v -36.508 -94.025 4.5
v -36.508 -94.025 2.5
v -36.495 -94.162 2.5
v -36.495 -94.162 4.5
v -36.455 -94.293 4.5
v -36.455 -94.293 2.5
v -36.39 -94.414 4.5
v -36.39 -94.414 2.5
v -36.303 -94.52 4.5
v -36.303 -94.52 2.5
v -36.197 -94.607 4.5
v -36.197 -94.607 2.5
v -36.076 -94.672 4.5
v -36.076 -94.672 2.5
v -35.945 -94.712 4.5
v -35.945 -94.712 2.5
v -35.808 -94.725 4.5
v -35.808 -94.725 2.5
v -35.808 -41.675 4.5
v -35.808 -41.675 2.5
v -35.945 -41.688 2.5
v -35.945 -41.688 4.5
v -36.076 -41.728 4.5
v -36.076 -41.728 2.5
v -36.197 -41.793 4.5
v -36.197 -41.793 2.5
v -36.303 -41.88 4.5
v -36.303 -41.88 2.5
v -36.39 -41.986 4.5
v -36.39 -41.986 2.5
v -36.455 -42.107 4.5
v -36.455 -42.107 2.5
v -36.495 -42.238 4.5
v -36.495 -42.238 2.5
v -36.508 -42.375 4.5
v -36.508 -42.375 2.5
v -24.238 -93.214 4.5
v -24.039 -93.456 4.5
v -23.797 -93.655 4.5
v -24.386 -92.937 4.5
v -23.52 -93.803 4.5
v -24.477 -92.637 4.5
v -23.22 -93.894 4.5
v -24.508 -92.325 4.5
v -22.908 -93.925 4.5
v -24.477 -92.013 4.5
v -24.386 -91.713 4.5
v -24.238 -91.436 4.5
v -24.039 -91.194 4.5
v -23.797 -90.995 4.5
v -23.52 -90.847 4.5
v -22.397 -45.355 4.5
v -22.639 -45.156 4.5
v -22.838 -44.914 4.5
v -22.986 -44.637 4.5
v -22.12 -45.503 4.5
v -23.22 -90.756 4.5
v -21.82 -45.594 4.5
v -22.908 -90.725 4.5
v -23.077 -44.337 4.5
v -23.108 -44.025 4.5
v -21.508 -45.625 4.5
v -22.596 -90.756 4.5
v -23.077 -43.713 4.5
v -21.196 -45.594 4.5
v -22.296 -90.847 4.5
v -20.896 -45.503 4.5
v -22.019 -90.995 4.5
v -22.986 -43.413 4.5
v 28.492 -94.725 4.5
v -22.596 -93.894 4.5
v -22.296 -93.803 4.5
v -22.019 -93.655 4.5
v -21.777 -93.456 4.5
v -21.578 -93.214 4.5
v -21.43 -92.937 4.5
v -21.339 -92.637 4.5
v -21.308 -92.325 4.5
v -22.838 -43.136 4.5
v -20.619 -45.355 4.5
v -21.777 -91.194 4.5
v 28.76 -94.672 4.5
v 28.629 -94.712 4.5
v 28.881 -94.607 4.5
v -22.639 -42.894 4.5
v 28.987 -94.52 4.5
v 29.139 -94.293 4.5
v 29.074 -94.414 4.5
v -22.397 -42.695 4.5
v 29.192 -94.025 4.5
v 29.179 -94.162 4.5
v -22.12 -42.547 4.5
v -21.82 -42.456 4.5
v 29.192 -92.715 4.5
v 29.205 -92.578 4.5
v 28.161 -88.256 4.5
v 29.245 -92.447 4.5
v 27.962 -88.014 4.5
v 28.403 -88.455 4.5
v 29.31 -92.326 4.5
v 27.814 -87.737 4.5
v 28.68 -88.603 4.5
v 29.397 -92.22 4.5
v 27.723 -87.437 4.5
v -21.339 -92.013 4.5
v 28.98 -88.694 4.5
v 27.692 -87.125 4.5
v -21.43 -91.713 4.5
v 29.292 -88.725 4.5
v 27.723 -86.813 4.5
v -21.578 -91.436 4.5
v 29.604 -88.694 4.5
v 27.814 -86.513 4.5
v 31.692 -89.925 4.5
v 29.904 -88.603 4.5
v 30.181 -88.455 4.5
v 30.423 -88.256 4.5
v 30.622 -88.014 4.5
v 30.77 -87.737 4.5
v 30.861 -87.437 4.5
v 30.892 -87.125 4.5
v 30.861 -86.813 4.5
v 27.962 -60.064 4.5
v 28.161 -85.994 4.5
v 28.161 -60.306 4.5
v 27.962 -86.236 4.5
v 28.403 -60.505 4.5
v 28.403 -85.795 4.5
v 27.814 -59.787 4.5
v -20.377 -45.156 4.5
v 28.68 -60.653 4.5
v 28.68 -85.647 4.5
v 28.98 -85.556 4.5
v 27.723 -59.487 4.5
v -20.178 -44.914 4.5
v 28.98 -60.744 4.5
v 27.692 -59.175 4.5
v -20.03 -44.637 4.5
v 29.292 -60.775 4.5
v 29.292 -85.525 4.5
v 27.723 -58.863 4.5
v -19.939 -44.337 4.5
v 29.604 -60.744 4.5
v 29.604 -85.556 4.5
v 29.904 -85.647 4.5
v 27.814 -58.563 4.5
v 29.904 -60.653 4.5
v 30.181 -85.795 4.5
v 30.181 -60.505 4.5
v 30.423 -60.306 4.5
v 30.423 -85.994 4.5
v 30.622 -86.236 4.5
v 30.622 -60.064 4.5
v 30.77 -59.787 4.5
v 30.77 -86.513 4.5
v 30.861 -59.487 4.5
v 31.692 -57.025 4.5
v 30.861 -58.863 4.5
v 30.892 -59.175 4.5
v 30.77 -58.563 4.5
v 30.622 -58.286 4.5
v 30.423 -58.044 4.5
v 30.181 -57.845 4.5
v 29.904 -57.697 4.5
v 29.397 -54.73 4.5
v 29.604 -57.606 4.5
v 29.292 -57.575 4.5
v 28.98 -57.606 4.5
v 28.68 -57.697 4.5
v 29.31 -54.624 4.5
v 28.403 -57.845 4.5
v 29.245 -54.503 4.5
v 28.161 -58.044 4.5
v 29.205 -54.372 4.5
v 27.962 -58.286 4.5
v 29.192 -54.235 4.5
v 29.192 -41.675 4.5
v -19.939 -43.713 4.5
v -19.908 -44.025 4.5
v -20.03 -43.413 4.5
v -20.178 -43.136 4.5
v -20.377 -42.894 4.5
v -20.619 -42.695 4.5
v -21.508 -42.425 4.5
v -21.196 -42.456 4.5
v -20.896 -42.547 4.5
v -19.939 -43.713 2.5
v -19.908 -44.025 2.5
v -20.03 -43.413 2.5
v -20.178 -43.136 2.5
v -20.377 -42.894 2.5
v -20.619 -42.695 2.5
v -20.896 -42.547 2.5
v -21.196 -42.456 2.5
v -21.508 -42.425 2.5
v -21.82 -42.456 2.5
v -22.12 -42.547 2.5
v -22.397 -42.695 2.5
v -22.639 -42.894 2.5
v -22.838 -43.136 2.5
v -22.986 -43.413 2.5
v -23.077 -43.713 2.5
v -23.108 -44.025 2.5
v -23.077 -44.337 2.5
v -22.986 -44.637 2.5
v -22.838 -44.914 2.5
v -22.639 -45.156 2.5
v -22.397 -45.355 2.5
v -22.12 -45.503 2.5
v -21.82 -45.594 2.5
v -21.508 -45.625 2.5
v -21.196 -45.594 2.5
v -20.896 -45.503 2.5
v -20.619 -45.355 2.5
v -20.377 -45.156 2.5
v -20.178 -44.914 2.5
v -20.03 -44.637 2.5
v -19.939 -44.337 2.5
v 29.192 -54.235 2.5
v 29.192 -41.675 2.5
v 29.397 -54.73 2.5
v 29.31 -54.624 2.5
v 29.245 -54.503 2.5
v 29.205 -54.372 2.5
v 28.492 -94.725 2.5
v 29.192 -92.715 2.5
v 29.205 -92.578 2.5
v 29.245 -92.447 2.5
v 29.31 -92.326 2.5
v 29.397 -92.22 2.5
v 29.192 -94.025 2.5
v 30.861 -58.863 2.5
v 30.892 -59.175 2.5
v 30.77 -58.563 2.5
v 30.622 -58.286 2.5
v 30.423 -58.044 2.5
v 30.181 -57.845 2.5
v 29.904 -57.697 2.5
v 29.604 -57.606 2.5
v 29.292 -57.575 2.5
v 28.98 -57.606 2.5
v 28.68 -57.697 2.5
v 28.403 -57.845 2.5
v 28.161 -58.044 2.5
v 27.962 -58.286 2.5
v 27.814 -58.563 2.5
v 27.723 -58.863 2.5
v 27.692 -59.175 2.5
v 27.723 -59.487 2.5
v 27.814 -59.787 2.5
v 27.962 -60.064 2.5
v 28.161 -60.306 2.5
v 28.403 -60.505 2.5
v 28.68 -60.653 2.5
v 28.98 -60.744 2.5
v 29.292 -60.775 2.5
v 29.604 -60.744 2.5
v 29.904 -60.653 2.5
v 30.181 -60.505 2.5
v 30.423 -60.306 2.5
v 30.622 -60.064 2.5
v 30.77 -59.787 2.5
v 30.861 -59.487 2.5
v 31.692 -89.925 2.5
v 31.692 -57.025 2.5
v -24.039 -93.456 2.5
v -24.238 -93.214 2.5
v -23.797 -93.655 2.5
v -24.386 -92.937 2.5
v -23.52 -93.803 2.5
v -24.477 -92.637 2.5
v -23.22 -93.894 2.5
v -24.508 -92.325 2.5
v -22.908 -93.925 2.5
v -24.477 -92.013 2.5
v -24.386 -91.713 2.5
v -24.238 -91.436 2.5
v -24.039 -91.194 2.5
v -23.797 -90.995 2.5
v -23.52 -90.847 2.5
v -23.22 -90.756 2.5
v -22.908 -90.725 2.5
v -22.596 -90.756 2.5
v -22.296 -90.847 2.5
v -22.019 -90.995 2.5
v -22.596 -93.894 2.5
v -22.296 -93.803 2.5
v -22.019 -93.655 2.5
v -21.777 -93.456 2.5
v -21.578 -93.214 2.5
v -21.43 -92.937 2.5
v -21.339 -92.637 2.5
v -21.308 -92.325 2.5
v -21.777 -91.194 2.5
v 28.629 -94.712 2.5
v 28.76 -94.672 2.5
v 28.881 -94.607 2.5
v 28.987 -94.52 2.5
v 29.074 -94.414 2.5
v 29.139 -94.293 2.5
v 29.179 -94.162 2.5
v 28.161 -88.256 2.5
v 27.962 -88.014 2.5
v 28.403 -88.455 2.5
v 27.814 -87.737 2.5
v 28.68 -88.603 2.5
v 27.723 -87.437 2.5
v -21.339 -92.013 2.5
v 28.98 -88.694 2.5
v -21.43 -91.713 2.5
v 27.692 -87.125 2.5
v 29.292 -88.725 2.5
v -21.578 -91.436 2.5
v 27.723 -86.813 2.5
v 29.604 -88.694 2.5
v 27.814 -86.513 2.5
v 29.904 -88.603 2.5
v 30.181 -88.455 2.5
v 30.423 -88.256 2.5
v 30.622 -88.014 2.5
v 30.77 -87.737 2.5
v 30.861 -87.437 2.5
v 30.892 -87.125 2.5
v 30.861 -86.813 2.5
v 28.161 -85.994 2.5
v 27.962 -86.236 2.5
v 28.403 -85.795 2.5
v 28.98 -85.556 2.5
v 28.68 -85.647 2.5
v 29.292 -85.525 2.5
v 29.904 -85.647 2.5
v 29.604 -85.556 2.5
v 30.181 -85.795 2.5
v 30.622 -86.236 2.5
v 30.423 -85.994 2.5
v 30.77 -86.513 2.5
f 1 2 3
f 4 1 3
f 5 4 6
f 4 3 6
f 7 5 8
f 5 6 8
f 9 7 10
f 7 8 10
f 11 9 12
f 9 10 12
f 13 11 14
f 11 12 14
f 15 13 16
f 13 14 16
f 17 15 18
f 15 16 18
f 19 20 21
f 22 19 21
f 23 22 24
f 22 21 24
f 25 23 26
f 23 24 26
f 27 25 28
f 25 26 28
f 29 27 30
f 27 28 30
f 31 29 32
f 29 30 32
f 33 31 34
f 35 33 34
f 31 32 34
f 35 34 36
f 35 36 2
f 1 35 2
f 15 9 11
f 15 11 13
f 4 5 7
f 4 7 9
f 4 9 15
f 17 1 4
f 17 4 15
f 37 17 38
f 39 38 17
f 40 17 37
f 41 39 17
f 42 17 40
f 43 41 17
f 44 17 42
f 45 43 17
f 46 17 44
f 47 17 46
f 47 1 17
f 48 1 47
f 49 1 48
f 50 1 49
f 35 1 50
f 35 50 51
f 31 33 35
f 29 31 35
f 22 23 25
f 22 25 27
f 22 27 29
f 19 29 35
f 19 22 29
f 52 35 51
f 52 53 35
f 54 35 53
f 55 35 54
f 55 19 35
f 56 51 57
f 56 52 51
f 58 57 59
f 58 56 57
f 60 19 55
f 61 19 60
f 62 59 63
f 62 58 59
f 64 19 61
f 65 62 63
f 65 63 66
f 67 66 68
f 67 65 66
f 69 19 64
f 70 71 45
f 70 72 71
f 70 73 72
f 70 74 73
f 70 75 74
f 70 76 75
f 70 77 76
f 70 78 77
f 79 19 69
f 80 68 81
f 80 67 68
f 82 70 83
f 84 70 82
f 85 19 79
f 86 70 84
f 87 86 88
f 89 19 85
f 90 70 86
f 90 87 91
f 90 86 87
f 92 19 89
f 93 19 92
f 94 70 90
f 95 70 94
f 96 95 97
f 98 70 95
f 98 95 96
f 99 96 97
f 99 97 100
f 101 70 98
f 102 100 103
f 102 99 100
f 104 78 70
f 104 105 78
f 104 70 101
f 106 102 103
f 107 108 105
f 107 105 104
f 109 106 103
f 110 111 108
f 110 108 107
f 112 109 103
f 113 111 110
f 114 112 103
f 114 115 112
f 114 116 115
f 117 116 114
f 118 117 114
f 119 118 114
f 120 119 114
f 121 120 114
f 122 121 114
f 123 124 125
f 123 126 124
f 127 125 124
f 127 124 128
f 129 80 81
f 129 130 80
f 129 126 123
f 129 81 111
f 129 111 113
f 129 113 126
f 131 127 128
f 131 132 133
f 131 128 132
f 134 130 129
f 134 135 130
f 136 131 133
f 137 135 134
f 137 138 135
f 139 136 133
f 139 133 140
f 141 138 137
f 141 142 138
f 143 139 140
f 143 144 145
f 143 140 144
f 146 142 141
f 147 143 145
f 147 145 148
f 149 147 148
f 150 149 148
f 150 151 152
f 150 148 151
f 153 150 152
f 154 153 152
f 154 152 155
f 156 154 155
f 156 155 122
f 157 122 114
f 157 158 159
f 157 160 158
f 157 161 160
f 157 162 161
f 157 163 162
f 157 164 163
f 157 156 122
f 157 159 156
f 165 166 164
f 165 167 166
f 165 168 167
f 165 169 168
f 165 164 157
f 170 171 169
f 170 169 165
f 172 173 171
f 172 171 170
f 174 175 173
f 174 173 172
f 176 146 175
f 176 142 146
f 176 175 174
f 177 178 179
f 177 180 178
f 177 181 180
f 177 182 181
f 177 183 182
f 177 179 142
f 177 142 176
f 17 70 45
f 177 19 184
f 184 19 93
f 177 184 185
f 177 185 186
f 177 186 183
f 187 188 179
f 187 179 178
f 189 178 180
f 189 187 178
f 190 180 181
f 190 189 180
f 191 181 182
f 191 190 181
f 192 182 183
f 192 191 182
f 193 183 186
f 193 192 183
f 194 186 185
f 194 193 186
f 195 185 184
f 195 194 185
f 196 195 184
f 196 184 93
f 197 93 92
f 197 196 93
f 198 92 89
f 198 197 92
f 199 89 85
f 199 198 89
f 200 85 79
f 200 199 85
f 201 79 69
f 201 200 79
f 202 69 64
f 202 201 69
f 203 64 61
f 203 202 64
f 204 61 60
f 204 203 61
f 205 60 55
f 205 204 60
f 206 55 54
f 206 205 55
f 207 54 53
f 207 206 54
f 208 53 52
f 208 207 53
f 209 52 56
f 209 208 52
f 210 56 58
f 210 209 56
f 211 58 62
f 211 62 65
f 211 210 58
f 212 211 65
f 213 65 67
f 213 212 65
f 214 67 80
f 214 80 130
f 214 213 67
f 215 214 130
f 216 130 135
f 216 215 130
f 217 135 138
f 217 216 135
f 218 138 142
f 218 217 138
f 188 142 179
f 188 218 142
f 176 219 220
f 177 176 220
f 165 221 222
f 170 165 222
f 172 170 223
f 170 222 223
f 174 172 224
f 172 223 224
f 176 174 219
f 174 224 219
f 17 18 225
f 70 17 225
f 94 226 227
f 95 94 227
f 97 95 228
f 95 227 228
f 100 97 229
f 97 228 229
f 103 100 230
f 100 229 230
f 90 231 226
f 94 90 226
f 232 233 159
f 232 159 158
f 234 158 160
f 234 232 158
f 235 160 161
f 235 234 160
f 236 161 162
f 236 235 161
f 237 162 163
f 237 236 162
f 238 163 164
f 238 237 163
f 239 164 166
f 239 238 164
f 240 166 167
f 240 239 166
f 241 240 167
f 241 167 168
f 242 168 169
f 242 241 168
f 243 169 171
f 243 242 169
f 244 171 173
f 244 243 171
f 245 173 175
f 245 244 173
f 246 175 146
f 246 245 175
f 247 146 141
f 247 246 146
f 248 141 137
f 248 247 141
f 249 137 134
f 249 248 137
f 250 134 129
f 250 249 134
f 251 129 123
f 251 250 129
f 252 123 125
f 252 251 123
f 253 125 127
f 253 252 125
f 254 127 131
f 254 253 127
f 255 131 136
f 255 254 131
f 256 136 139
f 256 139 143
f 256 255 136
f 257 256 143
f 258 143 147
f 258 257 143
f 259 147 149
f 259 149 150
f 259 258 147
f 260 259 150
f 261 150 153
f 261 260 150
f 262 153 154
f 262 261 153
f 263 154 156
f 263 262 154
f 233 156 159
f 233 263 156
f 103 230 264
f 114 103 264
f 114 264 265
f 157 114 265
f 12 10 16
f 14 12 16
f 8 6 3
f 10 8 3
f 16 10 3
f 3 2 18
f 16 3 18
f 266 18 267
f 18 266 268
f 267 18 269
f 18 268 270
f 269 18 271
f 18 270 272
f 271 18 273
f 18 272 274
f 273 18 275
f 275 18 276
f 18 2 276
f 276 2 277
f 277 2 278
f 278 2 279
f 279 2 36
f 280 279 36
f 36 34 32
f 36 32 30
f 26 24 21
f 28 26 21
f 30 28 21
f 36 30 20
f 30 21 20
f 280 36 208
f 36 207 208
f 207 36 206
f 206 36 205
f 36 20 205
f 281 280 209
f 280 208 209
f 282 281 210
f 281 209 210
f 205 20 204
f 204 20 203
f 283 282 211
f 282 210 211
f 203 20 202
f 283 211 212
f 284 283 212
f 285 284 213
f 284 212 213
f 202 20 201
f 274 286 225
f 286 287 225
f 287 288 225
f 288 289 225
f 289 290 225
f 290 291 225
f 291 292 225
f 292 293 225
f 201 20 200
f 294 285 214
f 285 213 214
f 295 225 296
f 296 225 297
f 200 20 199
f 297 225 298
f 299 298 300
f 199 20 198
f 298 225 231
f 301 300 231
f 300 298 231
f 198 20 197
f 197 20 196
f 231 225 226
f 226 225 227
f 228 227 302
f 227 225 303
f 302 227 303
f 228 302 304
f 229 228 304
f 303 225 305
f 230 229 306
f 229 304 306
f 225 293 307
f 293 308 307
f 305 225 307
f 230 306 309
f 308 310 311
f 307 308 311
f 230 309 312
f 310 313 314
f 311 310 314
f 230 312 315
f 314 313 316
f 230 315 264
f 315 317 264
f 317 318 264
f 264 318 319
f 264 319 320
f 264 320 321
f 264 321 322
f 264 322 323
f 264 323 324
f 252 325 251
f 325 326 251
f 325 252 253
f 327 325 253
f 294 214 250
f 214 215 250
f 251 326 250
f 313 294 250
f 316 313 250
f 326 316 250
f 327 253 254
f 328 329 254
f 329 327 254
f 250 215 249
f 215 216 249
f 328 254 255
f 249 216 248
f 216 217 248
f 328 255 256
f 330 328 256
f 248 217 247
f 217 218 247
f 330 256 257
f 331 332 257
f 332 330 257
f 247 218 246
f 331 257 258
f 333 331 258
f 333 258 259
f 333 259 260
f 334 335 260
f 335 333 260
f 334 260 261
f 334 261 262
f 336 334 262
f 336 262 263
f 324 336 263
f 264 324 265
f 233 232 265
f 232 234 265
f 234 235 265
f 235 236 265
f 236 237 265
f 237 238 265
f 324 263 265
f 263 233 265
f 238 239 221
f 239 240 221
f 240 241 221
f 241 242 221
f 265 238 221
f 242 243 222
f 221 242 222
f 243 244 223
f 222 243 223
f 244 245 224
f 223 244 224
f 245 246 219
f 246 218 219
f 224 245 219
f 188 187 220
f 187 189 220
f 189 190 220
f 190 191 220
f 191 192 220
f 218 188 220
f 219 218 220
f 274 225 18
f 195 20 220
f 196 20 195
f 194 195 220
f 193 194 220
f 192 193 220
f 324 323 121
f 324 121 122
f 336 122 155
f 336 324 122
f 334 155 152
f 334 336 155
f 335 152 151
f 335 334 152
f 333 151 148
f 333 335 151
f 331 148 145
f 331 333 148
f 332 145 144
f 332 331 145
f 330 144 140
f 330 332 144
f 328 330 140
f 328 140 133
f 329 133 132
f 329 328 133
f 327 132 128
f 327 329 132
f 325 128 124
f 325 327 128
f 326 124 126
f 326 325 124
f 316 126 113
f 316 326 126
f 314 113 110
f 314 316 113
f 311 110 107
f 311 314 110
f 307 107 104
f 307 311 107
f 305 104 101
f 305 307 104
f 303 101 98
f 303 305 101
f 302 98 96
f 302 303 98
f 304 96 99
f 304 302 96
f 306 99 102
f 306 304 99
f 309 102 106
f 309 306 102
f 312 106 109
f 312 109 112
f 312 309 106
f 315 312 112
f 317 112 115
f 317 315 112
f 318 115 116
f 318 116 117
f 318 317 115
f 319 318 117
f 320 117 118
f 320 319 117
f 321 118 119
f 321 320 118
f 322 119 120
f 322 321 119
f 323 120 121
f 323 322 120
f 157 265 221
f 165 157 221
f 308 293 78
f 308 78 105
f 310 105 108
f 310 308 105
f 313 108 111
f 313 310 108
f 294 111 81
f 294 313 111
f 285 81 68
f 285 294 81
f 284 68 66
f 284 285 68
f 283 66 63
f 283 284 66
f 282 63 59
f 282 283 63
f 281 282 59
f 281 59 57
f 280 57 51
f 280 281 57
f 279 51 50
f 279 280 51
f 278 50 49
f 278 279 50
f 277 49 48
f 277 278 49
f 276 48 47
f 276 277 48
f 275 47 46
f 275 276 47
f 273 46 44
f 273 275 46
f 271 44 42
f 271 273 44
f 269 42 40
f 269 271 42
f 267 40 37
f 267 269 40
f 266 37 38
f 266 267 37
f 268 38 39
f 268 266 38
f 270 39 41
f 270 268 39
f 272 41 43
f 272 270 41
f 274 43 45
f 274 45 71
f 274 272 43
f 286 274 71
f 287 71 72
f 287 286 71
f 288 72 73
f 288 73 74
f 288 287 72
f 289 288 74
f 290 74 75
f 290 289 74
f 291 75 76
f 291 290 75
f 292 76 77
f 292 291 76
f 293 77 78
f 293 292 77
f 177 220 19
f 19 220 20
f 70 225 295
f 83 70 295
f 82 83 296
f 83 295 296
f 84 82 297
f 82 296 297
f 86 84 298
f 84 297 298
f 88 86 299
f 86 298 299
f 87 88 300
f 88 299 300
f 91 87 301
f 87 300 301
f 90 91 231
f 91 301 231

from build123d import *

# Parameters (mm, degrees)
BOSS_EXTRUDE1_START = 2.5
SKETCH1_R           = 1.6
BOSS_EXTRUDE1_DEPTH = 2


with BuildPart() as part:
    # Sketch1 → Boss-Extrude1 (new body)
    with BuildSketch(Plane.XY.offset(BOSS_EXTRUDE1_START)):
        with BuildLine():
            Line((-36.508029185, -42.375), (-36.508029185, -94.025))
            ThreePointArc((-36.508029185, -94.025), (-36.303003932, -94.519974747), (-35.808029185, -94.725))
            Line((-35.808029185, -94.725), (28.491970815, -94.725))
            ThreePointArc((28.491970815, -94.725), (28.986945562, -94.519974747), (29.191970815, -94.025))
            Line((29.191970815, -94.025), (29.191970815, -92.714949494))
            ThreePointArc((29.191970815, -92.714949494), (29.245255142, -92.447071091), (29.396996068, -92.219974747))
            Line((29.396996068, -92.219974747), (31.691970815, -89.925))
            Line((31.691970815, -89.925), (31.691970815, -57.025))
            Line((31.691970815, -57.025), (29.396996068, -54.730025253))
            ThreePointArc((29.396996068, -54.730025253), (29.245255142, -54.502928909), (29.191970815, -54.235050506))
            Line((29.191970815, -54.235050506), (29.191970815, -41.675))
            Line((29.191970815, -41.675), (-35.808029185, -41.675))
            ThreePointArc((-35.808029185, -41.675), (-36.303003932, -41.880025253), (-36.508029185, -42.375))
        make_face()
        with Locations((-21.508029185, -44.025)):
            Circle(SKETCH1_R, mode=Mode.SUBTRACT)
        with Locations((-22.908029185, -92.325)):
            Circle(SKETCH1_R, mode=Mode.SUBTRACT)
        with Locations((29.291970815, -59.175)):
            Circle(SKETCH1_R, mode=Mode.SUBTRACT)
        with Locations((29.291970815, -87.125)):
            Circle(SKETCH1_R, mode=Mode.SUBTRACT)
    extrude(amount=BOSS_EXTRUDE1_DEPTH)


solid = part.part
